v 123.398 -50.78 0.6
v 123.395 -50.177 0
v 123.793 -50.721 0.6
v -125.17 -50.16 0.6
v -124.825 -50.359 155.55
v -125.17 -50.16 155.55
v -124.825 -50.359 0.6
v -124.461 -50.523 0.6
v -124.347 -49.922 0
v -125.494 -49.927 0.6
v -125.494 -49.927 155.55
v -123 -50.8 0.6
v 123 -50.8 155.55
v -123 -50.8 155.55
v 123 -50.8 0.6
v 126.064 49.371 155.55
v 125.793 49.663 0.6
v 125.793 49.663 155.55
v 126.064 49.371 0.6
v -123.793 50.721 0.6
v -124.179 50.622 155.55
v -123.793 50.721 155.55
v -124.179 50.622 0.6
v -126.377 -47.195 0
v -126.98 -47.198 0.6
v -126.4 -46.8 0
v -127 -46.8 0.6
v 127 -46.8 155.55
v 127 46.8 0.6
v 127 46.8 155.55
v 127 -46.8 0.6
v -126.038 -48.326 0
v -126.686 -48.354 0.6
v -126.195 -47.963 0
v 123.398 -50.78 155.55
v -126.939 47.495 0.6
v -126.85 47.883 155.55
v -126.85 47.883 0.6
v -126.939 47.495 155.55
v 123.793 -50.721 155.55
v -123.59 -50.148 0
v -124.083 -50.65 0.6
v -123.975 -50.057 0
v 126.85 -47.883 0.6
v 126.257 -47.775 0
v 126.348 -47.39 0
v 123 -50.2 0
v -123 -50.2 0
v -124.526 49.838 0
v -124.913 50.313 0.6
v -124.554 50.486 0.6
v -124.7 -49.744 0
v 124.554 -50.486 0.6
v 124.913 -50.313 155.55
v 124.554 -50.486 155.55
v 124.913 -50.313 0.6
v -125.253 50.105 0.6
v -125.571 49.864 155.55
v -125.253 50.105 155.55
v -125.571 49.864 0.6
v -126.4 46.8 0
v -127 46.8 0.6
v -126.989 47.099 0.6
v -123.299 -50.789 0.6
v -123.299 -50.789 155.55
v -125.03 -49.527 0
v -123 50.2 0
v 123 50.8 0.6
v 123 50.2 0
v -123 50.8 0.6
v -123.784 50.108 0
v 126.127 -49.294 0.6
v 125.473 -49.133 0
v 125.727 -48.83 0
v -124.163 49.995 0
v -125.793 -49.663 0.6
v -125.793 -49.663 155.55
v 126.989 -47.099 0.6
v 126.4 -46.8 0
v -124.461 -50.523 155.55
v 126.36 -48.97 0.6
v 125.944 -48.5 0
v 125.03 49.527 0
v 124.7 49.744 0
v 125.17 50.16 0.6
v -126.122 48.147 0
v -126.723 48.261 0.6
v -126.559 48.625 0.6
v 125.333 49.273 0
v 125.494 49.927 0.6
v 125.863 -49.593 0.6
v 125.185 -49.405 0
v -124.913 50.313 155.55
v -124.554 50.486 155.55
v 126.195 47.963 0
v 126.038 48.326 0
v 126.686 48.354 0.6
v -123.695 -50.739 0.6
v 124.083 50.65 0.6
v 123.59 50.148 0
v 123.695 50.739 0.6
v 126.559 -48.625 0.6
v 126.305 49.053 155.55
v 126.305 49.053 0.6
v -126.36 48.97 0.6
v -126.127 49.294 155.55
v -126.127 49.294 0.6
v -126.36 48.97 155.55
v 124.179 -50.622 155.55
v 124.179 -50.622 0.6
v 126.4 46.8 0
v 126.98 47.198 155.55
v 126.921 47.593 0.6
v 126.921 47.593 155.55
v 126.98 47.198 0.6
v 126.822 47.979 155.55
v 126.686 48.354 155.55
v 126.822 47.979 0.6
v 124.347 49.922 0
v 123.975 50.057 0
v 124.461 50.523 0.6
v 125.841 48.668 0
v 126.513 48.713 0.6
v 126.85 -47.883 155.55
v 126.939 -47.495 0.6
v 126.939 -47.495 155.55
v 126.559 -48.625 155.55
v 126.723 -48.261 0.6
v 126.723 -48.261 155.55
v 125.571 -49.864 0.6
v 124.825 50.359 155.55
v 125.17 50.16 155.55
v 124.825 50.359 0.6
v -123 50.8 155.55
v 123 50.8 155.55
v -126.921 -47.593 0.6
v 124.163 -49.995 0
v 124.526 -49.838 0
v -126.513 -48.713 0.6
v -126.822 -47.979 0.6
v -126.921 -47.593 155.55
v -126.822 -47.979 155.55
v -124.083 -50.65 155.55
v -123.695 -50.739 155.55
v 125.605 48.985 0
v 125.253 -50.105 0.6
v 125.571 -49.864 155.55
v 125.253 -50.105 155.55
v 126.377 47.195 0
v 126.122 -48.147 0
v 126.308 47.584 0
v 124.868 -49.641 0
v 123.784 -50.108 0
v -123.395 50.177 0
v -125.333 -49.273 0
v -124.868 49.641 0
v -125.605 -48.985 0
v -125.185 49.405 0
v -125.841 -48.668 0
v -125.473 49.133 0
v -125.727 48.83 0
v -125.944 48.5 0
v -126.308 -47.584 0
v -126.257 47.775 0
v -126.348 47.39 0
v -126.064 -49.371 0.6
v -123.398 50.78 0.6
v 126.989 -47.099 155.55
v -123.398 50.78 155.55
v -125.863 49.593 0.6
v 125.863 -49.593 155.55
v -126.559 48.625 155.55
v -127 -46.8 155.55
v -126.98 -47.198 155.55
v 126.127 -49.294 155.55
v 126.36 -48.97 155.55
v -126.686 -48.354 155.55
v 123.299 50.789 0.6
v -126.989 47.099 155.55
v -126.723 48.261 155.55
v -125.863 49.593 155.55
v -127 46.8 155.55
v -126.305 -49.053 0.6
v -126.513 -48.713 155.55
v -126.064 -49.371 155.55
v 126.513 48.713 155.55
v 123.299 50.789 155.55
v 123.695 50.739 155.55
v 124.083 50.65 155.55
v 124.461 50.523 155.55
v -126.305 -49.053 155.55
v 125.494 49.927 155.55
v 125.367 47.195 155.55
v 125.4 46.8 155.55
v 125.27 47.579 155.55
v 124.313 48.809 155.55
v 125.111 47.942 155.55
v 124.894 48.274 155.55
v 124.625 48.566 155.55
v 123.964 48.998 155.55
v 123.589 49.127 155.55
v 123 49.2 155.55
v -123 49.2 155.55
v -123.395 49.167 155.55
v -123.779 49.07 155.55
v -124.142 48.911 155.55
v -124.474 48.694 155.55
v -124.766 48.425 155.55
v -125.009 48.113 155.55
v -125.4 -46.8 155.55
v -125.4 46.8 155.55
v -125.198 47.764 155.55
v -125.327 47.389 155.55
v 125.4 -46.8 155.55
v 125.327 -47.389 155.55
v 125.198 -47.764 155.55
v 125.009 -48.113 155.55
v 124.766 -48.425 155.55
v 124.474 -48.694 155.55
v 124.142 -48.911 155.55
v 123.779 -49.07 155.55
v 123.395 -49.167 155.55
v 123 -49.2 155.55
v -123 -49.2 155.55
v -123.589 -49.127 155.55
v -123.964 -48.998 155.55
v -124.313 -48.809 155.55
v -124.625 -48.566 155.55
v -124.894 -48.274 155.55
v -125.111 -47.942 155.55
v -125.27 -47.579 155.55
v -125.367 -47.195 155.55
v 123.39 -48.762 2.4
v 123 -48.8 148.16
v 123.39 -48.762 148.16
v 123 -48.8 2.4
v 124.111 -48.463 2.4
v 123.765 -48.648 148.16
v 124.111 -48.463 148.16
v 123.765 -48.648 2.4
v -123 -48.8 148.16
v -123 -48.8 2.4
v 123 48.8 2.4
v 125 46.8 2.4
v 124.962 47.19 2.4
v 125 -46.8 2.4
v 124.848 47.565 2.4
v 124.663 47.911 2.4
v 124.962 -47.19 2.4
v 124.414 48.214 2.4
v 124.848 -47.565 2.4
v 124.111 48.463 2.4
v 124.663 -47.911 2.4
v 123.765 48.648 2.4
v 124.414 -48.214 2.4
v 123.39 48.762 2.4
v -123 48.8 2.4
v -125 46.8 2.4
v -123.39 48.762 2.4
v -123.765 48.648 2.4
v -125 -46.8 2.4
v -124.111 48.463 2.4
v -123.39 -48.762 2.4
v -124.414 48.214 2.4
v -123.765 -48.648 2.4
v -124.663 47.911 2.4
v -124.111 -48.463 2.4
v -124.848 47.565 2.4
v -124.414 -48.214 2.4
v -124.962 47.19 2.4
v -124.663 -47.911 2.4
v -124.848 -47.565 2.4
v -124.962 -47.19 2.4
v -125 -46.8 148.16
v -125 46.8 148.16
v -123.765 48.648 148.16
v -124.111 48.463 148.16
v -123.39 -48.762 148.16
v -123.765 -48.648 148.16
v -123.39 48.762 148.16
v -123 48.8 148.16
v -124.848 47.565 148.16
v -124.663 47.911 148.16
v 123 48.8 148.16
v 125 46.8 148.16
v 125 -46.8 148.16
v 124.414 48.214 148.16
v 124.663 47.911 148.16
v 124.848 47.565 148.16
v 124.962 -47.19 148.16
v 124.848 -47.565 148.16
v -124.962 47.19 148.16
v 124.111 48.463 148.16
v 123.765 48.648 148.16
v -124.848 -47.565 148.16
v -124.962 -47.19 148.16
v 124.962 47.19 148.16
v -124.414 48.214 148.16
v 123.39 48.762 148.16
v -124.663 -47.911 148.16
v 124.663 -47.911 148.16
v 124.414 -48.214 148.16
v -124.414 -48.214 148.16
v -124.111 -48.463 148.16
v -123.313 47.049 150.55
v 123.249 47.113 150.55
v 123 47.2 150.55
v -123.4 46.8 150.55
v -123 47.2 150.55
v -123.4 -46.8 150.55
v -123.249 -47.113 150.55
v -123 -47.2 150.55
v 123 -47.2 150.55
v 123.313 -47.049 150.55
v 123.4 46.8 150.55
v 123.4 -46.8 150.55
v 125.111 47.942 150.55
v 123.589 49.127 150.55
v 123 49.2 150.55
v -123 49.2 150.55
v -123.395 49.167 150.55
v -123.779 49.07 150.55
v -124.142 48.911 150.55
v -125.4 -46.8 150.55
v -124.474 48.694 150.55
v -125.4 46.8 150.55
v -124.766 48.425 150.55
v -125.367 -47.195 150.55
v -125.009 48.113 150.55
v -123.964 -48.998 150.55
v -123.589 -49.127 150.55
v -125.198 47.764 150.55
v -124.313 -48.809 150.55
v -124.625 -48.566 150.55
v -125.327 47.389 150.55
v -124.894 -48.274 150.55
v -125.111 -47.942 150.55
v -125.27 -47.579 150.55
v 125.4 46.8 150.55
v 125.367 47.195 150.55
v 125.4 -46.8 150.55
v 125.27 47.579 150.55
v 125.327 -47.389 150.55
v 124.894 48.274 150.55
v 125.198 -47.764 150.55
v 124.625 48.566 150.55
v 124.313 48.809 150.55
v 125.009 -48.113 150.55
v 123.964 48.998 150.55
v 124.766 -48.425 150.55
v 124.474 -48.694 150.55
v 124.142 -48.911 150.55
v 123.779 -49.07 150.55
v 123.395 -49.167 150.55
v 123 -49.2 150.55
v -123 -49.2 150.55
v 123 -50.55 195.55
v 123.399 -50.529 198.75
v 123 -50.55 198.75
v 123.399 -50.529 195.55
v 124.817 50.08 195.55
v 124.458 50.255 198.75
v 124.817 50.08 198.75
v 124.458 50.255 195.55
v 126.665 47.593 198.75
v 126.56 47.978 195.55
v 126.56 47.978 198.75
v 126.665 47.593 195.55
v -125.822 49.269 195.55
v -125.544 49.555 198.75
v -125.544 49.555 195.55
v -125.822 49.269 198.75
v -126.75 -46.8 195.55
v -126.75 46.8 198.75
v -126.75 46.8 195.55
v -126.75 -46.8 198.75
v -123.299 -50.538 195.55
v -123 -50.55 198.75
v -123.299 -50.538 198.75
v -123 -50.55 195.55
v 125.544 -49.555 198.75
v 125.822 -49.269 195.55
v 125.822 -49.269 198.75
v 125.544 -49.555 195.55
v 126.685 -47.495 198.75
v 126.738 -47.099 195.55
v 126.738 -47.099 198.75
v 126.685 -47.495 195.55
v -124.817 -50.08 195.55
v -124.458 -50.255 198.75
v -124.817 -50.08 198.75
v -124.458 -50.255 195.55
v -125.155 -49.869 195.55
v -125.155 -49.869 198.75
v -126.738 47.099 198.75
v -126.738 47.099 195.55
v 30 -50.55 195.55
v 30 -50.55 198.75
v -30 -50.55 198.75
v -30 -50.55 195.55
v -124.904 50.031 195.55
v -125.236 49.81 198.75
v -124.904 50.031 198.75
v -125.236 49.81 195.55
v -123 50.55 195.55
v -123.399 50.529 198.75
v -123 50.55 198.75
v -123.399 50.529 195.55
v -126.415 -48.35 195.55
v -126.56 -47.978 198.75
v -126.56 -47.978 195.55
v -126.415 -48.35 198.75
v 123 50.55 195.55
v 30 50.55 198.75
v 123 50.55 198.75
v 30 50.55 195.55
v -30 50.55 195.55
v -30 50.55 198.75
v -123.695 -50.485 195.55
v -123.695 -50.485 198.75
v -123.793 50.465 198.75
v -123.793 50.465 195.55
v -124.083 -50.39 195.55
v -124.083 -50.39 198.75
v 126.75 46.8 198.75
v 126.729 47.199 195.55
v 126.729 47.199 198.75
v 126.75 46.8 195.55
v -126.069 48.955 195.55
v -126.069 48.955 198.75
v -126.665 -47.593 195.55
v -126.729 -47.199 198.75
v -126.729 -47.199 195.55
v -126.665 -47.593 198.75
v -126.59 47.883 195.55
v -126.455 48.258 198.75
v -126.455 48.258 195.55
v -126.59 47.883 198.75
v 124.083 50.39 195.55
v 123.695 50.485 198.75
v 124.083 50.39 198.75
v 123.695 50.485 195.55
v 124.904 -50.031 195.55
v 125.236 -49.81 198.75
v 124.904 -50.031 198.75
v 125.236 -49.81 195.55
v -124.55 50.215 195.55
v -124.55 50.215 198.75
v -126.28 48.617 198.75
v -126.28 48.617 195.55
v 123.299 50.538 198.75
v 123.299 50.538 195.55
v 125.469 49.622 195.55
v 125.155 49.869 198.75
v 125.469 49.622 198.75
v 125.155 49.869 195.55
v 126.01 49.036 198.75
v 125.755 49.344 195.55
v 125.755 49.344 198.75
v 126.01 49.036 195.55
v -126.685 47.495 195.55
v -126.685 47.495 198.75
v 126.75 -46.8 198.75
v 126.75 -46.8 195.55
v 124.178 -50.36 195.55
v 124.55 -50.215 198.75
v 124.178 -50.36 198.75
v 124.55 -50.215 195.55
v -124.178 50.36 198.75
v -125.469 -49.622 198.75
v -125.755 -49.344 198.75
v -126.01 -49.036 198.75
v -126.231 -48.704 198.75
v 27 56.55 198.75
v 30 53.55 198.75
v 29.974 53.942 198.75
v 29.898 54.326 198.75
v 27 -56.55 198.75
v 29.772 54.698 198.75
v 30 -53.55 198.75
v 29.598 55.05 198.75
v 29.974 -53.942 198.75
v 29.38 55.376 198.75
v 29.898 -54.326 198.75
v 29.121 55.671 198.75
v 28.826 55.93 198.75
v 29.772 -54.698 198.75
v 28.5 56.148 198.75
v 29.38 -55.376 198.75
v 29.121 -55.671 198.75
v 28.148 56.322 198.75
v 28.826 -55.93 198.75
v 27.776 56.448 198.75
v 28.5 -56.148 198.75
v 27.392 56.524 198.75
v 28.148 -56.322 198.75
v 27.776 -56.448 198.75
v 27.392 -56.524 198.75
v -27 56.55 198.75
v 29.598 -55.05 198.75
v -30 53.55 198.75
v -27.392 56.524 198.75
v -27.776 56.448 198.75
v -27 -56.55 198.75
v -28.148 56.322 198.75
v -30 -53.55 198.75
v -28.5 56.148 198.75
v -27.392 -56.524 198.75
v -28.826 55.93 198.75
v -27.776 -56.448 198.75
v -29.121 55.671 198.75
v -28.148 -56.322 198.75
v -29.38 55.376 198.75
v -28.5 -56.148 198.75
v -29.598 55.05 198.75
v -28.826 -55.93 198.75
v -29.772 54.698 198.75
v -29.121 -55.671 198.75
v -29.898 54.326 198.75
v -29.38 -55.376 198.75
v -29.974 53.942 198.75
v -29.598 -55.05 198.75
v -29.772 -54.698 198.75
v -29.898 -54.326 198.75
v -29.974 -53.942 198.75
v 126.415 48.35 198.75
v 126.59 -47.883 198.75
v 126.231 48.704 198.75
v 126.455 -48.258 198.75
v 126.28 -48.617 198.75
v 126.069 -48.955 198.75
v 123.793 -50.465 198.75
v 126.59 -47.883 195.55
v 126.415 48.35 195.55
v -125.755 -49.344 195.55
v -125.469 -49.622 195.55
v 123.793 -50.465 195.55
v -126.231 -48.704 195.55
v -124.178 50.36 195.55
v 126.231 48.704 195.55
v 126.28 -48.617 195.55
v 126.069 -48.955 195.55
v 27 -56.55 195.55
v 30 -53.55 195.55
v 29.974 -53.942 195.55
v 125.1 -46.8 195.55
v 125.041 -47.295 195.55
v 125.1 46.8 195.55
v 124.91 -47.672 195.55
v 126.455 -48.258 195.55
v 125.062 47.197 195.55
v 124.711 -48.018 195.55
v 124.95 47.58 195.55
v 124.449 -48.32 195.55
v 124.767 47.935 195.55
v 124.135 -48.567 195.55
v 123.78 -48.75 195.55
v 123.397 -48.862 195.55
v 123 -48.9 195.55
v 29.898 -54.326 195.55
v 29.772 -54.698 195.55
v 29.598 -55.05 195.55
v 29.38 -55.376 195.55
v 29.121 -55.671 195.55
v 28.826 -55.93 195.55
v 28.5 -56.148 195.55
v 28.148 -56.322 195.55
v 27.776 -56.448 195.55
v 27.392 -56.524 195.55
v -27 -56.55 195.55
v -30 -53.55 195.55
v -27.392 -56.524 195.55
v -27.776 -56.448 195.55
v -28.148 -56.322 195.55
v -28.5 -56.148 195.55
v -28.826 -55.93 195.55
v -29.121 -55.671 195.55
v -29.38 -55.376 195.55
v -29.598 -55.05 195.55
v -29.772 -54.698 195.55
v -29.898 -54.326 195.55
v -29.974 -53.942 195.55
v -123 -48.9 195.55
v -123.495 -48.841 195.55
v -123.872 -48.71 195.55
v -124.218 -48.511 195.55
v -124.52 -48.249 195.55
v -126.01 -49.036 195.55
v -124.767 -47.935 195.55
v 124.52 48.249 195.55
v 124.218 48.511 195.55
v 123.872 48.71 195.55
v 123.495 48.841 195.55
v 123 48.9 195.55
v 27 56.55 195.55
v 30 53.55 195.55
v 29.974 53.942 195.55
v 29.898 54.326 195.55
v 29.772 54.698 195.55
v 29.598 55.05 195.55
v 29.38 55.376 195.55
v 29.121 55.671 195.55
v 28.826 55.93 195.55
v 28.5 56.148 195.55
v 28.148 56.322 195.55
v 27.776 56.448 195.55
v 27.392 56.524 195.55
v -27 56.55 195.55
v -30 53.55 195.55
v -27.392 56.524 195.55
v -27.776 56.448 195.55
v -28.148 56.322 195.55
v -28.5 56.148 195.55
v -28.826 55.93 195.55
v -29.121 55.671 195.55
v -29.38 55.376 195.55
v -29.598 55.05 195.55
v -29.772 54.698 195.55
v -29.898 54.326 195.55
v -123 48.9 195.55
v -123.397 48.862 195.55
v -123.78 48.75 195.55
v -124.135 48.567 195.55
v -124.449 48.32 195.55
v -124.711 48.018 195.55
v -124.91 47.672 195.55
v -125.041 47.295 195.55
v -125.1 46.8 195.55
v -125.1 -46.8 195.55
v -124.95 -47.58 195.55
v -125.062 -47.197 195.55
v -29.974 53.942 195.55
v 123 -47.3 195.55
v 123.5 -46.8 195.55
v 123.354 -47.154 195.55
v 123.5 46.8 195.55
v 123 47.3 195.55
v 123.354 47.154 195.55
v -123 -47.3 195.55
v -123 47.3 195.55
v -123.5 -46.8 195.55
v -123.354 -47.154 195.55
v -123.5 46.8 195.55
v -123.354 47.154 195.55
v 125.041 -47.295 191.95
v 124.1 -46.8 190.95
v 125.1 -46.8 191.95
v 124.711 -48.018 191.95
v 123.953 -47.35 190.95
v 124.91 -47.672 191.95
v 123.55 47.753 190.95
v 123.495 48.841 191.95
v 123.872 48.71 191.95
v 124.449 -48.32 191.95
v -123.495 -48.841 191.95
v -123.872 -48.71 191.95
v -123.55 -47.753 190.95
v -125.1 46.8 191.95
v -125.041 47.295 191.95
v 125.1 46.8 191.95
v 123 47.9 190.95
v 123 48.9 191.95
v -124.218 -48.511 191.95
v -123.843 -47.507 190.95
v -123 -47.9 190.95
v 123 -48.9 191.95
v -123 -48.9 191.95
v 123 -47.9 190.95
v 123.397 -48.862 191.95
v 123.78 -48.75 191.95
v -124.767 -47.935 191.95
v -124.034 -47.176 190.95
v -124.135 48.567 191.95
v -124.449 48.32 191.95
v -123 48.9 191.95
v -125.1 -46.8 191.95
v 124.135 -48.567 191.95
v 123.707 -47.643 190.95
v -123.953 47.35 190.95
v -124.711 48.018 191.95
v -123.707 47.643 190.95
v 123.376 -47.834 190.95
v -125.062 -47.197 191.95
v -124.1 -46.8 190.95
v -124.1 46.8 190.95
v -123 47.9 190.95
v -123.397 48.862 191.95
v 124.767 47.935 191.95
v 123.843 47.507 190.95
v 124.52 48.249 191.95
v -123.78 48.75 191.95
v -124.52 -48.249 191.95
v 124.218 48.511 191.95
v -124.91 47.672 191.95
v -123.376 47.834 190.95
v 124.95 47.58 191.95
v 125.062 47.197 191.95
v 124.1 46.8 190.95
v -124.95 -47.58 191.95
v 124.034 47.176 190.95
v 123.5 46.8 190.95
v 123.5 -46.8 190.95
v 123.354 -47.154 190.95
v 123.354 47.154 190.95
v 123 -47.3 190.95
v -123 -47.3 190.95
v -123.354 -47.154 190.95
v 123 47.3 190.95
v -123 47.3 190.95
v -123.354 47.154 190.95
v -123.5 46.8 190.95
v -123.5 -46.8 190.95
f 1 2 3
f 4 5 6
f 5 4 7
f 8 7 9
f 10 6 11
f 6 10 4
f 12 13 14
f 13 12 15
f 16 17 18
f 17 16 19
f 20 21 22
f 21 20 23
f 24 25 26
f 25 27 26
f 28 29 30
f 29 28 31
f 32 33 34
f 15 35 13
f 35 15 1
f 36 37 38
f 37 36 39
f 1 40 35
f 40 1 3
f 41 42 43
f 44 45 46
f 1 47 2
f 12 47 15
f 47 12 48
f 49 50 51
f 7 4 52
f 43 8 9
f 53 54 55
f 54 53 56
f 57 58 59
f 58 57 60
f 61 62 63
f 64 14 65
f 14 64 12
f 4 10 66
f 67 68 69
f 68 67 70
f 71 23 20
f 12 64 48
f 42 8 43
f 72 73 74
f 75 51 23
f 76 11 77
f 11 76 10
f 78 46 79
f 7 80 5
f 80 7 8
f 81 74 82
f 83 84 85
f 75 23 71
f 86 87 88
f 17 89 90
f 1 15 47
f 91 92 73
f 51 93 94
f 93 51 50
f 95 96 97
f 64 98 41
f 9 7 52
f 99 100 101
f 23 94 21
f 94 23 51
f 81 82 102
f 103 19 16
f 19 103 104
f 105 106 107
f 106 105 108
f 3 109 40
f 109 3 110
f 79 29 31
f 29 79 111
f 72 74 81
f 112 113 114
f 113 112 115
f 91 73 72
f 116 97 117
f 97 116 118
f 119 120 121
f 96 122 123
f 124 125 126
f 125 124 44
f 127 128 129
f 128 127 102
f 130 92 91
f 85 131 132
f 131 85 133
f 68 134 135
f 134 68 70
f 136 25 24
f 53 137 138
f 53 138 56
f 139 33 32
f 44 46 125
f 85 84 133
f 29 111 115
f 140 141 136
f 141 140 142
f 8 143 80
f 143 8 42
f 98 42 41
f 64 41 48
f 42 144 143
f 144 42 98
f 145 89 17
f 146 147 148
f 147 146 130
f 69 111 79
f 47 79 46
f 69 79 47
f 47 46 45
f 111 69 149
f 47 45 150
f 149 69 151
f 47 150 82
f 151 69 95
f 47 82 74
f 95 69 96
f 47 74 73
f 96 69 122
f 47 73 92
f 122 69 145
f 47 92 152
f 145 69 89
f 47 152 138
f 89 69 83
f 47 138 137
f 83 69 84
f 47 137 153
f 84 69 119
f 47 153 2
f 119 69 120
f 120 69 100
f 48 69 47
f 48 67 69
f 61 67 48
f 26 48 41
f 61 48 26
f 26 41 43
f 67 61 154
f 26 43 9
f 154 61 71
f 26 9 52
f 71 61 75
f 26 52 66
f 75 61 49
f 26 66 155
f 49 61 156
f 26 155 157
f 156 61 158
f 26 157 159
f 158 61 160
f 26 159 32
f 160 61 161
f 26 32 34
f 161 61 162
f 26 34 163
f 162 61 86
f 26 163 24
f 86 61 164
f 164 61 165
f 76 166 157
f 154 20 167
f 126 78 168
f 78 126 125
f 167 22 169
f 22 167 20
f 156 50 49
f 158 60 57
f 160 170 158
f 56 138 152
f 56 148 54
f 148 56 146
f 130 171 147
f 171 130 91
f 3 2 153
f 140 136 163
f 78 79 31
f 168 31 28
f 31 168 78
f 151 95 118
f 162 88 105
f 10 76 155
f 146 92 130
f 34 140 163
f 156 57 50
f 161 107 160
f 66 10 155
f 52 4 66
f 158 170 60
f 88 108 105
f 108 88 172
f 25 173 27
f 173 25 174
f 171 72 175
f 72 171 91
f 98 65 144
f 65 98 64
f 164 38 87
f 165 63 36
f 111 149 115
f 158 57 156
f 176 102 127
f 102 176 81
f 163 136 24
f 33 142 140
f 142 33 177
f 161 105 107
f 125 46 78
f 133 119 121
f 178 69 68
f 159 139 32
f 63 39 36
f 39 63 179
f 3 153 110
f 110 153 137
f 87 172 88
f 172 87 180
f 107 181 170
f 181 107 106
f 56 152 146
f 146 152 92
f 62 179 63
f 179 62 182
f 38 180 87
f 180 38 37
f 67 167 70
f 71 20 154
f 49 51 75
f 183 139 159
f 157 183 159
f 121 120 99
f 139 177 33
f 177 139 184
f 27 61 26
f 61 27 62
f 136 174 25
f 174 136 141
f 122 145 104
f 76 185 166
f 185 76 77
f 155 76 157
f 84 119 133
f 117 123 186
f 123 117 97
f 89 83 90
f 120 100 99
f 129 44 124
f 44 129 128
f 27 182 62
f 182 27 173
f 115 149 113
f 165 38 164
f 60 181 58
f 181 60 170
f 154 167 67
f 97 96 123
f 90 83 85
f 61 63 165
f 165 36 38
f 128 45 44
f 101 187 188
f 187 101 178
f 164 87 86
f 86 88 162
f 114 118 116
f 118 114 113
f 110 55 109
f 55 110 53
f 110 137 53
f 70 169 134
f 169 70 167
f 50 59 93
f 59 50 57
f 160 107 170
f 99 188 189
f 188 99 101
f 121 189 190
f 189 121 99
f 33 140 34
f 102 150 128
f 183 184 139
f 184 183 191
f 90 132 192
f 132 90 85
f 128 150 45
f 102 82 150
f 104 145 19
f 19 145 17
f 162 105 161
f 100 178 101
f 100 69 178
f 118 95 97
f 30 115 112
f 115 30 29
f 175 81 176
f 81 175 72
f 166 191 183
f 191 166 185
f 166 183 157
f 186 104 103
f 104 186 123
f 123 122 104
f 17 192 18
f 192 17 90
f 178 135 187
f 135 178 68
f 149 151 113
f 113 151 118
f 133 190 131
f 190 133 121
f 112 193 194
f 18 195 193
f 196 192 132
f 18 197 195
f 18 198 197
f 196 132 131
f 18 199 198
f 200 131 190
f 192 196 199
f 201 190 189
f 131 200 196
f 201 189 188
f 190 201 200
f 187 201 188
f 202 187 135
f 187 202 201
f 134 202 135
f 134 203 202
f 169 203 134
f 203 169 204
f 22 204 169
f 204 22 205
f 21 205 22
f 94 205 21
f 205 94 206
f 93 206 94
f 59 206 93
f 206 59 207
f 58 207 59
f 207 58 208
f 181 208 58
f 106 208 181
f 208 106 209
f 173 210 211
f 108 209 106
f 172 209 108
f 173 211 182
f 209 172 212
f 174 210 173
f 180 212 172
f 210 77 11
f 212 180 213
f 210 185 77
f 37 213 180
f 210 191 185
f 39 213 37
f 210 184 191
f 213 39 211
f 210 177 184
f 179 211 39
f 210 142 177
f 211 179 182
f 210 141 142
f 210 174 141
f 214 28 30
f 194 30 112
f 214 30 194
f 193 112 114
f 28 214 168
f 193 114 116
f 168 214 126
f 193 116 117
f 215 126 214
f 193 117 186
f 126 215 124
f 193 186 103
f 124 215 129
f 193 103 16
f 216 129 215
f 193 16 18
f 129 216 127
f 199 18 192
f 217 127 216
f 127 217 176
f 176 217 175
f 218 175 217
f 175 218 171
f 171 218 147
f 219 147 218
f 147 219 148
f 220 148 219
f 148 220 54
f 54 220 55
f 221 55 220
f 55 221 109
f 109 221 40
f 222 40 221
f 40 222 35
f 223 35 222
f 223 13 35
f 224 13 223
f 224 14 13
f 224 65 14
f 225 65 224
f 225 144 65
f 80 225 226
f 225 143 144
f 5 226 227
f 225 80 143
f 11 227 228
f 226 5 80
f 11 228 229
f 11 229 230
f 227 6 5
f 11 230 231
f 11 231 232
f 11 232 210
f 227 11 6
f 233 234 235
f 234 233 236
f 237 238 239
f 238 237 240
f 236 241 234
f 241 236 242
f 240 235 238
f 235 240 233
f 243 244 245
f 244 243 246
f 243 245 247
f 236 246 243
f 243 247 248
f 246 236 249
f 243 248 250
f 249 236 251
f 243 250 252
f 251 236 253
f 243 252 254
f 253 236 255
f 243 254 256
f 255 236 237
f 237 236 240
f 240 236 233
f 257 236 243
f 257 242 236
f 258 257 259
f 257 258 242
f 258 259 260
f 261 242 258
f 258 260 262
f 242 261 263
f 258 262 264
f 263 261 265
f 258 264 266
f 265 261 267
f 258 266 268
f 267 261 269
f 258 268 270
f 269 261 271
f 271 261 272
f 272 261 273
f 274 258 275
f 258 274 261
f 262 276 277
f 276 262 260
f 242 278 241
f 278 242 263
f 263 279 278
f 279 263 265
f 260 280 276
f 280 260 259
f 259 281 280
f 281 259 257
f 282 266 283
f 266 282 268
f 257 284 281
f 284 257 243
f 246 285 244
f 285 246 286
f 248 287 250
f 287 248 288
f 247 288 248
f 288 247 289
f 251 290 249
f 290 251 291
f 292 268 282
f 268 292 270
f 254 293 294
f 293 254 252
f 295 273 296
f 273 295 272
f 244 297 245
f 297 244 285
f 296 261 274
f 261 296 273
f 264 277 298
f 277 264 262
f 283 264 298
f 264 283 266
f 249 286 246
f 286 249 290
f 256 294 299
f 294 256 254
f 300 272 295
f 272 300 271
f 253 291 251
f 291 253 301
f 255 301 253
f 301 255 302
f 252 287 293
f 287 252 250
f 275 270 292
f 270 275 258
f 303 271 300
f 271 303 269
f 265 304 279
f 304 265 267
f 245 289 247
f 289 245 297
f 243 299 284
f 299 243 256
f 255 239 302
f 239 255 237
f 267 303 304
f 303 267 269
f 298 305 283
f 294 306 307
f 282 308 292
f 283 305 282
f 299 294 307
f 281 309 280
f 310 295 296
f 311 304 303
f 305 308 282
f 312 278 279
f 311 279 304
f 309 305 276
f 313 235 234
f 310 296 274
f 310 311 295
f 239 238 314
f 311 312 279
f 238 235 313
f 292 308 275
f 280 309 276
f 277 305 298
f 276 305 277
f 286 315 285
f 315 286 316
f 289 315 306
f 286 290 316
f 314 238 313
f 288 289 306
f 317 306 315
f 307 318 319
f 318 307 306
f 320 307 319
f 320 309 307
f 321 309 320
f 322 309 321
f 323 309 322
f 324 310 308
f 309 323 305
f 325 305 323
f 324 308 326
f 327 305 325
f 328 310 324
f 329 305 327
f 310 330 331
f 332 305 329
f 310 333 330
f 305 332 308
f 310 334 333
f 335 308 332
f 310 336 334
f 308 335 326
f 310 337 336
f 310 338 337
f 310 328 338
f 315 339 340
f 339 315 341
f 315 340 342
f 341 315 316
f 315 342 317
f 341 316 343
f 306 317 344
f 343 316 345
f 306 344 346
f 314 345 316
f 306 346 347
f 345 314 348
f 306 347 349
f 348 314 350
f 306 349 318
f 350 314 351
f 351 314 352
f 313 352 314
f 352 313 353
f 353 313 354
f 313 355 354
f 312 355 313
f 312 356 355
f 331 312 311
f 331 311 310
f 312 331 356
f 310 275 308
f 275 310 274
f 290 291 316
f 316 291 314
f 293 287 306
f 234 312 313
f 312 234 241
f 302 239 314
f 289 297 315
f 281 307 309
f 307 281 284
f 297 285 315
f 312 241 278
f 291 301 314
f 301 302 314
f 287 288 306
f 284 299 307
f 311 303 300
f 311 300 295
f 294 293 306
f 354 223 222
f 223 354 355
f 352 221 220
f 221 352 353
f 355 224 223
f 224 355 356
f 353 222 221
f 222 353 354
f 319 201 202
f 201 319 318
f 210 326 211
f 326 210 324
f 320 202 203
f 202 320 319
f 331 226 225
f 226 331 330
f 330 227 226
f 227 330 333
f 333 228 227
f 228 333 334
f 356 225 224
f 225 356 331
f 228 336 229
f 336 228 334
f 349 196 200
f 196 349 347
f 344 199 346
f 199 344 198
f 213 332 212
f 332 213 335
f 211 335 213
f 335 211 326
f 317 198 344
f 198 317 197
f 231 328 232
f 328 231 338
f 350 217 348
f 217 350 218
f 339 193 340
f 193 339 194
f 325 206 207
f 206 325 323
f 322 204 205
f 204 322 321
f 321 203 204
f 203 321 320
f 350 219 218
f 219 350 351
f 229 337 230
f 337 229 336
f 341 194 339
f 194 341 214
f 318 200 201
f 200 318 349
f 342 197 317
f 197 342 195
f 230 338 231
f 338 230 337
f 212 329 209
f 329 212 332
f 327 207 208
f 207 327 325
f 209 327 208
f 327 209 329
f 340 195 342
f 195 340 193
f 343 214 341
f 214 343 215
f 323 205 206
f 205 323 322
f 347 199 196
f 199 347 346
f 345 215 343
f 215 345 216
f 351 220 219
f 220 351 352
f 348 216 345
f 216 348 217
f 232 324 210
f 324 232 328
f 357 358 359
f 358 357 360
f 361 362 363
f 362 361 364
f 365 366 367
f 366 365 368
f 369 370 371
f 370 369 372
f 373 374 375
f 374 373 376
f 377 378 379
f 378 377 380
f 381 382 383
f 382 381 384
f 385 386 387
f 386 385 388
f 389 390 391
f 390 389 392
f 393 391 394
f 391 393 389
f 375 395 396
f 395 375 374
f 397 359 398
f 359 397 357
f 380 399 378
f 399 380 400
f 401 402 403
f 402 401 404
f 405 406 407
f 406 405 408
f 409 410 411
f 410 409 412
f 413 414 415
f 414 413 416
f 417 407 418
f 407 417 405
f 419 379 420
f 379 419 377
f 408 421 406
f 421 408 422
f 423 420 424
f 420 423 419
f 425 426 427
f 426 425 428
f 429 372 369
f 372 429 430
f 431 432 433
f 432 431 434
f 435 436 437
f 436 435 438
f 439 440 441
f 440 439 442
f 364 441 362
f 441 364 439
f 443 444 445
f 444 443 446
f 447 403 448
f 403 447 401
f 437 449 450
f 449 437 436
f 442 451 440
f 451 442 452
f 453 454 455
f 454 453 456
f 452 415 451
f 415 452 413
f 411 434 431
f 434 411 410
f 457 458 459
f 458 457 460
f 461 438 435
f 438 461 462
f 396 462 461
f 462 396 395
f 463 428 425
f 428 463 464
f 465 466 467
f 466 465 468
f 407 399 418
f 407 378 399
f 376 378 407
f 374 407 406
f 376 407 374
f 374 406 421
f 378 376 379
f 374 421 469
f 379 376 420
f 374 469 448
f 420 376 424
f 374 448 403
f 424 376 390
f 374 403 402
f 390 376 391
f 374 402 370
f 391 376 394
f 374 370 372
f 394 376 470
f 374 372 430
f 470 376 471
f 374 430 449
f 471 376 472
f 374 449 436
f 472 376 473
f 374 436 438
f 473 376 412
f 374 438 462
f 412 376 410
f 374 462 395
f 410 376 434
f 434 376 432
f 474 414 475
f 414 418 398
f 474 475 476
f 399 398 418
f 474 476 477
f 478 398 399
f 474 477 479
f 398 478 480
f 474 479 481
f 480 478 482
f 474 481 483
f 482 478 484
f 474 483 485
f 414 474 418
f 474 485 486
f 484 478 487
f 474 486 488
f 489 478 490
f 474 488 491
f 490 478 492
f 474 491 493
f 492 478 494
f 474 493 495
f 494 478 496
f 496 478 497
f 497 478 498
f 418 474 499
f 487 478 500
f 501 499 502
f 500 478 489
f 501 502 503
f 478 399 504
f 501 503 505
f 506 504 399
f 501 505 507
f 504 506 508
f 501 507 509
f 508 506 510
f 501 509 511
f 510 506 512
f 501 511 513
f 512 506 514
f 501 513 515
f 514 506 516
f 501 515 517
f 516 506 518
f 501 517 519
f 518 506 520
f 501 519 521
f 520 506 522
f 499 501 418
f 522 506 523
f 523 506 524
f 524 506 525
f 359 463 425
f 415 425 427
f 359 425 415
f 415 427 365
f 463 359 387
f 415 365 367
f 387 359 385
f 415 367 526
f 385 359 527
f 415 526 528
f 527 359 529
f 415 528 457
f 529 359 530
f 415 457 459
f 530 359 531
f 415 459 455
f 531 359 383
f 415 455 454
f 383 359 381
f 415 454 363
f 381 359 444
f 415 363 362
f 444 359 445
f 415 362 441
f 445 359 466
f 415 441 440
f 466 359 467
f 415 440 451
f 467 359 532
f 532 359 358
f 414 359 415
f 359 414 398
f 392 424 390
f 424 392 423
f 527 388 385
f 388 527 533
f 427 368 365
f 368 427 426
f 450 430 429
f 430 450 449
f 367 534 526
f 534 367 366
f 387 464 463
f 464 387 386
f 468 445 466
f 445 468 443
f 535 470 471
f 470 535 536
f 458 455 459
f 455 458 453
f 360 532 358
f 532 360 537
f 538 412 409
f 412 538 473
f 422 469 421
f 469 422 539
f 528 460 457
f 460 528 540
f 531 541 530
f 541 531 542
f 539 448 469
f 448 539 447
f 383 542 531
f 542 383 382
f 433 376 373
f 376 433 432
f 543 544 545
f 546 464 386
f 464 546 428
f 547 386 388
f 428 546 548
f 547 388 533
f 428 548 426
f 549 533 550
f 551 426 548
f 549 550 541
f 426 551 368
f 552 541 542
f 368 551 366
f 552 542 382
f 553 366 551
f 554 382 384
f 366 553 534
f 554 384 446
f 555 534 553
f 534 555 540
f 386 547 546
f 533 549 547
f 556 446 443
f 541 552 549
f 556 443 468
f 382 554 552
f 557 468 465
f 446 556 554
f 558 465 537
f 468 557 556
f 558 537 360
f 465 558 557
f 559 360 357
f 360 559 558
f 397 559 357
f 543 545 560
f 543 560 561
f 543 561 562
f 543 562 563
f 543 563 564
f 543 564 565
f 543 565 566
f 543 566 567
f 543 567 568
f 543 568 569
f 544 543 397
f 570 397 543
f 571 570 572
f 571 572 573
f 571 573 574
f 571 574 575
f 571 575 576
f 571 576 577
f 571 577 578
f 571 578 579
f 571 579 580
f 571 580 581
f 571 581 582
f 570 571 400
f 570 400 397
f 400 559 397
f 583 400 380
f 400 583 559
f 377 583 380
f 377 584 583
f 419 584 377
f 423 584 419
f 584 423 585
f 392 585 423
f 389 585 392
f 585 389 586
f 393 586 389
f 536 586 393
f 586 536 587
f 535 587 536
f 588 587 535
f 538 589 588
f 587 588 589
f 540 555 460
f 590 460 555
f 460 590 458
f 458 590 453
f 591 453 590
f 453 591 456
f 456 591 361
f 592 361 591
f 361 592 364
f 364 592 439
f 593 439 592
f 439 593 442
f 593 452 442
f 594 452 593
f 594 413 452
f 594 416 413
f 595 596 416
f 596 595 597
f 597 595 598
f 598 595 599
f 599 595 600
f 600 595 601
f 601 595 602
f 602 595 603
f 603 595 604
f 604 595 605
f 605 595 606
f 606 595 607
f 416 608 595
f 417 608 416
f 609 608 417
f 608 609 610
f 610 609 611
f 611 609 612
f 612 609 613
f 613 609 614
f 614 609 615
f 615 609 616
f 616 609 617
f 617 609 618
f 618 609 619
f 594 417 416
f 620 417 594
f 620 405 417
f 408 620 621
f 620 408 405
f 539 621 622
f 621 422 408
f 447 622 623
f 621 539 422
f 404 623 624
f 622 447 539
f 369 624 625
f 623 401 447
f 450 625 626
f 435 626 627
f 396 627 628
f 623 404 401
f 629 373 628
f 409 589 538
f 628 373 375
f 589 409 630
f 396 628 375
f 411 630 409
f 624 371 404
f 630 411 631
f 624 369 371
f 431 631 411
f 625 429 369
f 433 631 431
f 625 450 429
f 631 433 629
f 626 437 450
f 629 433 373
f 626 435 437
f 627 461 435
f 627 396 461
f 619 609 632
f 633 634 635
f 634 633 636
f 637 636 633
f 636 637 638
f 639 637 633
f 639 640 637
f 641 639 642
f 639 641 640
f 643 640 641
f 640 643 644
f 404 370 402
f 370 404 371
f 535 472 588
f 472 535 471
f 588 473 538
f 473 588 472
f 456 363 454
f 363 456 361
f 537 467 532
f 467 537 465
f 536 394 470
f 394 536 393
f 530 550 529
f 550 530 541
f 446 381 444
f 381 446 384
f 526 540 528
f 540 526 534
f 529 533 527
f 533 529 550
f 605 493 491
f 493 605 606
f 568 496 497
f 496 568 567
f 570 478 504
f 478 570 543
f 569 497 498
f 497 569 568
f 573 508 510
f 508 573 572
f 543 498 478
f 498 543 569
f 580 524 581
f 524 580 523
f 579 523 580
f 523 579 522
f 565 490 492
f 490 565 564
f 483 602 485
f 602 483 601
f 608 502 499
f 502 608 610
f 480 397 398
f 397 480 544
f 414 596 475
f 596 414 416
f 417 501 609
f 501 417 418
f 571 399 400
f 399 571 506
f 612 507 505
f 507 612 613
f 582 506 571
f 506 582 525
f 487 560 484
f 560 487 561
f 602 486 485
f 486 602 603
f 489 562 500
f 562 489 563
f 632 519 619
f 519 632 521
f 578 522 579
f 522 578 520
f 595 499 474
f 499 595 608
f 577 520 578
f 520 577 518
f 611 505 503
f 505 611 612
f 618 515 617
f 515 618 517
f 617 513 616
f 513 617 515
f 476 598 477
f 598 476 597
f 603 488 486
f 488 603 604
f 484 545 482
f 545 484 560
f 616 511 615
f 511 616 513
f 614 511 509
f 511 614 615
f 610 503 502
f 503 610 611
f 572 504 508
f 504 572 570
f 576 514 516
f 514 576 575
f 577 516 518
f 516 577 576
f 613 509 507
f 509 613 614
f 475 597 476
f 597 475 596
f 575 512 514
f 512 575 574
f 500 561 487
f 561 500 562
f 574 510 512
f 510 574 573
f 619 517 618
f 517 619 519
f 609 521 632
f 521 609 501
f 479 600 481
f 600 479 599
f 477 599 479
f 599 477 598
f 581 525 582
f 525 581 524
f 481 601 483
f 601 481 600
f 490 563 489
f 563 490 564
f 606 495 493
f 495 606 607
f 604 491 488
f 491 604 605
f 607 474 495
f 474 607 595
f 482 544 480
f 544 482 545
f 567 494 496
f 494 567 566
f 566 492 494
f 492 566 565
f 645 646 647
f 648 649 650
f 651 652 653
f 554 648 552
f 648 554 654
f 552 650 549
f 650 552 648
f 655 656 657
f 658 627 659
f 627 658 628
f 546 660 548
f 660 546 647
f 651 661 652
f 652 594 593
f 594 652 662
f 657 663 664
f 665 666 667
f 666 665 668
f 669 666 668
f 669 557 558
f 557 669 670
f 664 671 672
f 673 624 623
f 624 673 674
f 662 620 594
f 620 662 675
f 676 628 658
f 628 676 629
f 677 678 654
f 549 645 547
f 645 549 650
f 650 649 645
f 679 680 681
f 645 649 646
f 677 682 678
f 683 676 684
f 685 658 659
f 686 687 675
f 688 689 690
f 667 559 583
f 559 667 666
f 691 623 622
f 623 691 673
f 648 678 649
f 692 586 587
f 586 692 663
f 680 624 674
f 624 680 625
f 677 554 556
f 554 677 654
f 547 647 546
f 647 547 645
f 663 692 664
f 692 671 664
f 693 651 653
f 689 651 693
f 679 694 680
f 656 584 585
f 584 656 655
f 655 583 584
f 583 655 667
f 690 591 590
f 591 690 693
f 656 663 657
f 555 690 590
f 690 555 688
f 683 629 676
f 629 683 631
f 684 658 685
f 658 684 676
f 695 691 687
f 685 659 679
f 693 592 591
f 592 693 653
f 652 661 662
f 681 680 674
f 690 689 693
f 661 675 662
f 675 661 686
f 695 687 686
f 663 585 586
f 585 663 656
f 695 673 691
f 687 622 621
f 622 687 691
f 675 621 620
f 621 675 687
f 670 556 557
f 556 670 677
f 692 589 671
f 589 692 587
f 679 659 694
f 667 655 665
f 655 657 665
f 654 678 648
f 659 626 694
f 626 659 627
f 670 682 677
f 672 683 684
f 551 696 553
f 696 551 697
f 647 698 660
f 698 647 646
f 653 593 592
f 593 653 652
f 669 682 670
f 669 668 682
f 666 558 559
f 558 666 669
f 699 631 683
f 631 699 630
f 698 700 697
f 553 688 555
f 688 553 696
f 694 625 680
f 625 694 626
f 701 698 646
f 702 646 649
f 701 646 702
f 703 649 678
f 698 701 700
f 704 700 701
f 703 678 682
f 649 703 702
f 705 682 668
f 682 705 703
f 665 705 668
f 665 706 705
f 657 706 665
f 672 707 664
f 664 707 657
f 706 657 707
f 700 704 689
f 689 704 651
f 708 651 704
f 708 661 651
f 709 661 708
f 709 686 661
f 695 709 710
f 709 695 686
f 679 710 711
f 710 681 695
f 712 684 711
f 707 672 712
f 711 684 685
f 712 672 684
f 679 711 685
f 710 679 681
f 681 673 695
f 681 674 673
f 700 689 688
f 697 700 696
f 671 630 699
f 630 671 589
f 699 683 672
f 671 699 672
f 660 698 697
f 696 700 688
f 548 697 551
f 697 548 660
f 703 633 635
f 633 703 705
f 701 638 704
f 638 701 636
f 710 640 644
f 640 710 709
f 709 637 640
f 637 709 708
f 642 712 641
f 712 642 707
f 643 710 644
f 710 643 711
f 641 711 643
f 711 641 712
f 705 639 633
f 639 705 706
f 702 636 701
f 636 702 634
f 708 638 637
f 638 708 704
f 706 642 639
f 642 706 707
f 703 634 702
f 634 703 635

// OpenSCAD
// photo_box — shipping box for photos, with a proud inset lid
//
// Two parts, single-colour PLA, both print without supports.
//   box  prints open-face-up, floor on the bed
//   lid  prints top-face-down, skirt pointing up
//
// The four numbers below are the ones to change. Everything else is
// derived, so the model stays coherent at any size.

// ---- outside envelope (lid on) ----------------------------------------
box_w = 254;      // 10"    width
box_d = 101.6;    // 4"     depth
box_h = 158.75;   // 6.25"  height, lid seated

// ---- thicknesses ------------------------------------------------------
wall_t  = 2.0;    // side walls        (5 perimeters @ 0.4)
floor_t = 2.4;    // box floor         (6 perimeters)
lid_t   = 3.2;    // lid plate         (8 perimeters)

// ---- lid interface ----------------------------------------------------
rabbet_h = 5.0;   // how far the ledge sits below the rim
ledge_w  = 2.0;   // horizontal width of the ledge
rim_t    = 1.6;   // standing rim above the ledge (4 perimeters)
ramp_h   = 2.4;   // ramp thickening the wall into the rabbet zone. Rises 2.4
                  // while growing 1.6 inward — 34 deg off vertical, so it sits
                  // clear of the 45 deg self-support limit rather than on it.
skirt_w  = 1.6;   // lid skirt thickness (4 perimeters)
clr      = 0.3;   // lateral clearance, skirt to rim (PLA)
seat_gap = 0.4;   // skirt clears the ledge — the rim is the seat, not the ledge

// ---- cosmetic / ergonomic --------------------------------------------
corner_r   = 4.0;  // outside corner radius
lid_relief = 0.25; // lid plate inset from the outer face, per side
skirt_cham = 1.0;  // 45 deg lead-in so the lid self-centres on the way in
foot_cham  = 0.6;  // bottom outer edge — chamfer, not a round (elephant's foot)
grip_tab   = 6.0;  // lid grab tabs on front/back; set 0 for a plain rectangle
grip_tab_w = 60.0;

// ---- output -----------------------------------------------------------
part = "both";     // "box" | "lid" | "both"

$fa = 2;
$fs = 0.4;

// ---- derived ----------------------------------------------------------
body_h   = box_h - lid_t;        // rim top: the lid plate sits on this
ledge_z  = body_h - rabbet_h;    // up-facing ledge surface
ramp_z   = ledge_z - ramp_h;     // where the wall starts thickening
top_wall = rim_t + ledge_w;      // wall thickness through the rabbet zone
skirt_h  = rabbet_h - seat_gap;  // skirt stops short of the ledge

// Rounded-rectangle prism, centred in x/y, rising from z = 0.
module rrect_prism(w, d, r, h) {
    rr = max(min(r, w / 2 - 0.01, d / 2 - 0.01), 0.01);
    linear_extrude(height = h)
        offset(r = rr)
            square([w - 2 * rr, d - 2 * rr], center = true);
}

// ---- box --------------------------------------------------------------

module box_outer() {
    // Chamfered foot, then a straight prism the rest of the way up.
    hull() {
        rrect_prism(box_w - 2 * foot_cham, box_d - 2 * foot_cham,
                    corner_r - foot_cham, 0.01);
        translate([0, 0, foot_cham]) rrect_prism(box_w, box_d, corner_r, 0.01);
    }
    translate([0, 0, foot_cham])
        rrect_prism(box_w, box_d, corner_r, body_h - foot_cham);
}

// The cavity is cut in three stacked pieces. Each one is *wider* than the
// piece below it or tapers into it, so every newly exposed surface faces up
// or sits at 45 deg — nothing to support.
module box_cavity() {
    // Main volume, floor up to the ramp.
    translate([0, 0, floor_t])
        rrect_prism(box_w - 2 * wall_t, box_d - 2 * wall_t,
                    corner_r - wall_t, ramp_z - floor_t + 0.01);

    // 45 deg ramp: the wall thickens inward from wall_t to top_wall, giving
    // the rabbet something solid to be cut out of and hooping the top of a
    // large thin-walled box.
    hull() {
        translate([0, 0, ramp_z])
            rrect_prism(box_w - 2 * wall_t, box_d - 2 * wall_t,
                        corner_r - wall_t, 0.01);
        translate([0, 0, ledge_z - 0.01])
            rrect_prism(box_w - 2 * top_wall, box_d - 2 * top_wall,
                        corner_r - top_wall, 0.01);
    }

    // Rabbet: a wider cut above the ledge leaves the ledge as an up-facing
    // shelf and the rim as a standing fin.
    translate([0, 0, ledge_z])
        rrect_prism(box_w - 2 * rim_t, box_d - 2 * rim_t,
                    corner_r - rim_t, rabbet_h + 1);
}

module box() {
    difference() {
        box_outer();
        box_cavity();
    }
}

// ---- lid --------------------------------------------------------------
// Modelled in the assembled orientation: plate on top, skirt hanging down
// into the rabbet. Flipped for printing at the bottom of the file.

skirt_ow = box_w - 2 * rim_t - 2 * clr;
skirt_od = box_d - 2 * rim_t - 2 * clr;
skirt_or = corner_r - rim_t - clr;
skirt_z0 = body_h - skirt_h;

module lid() {
    // Plate, plus grab tabs overhanging the front and back walls.
    translate([0, 0, body_h]) {
        rrect_prism(box_w - 2 * lid_relief, box_d - 2 * lid_relief,
                    corner_r - lid_relief, lid_t);
        if (grip_tab > 0)
            rrect_prism(grip_tab_w,
                        box_d - 2 * lid_relief + 2 * grip_tab, 3, lid_t);
    }

    // Skirt: lateral register only. Its outer face runs against the rim's
    // inner face; a 45 deg lead-in lets it find the opening on the way down.
    difference() {
        union() {
            hull() {
                translate([0, 0, skirt_z0])
                    rrect_prism(skirt_ow - 2 * skirt_cham,
                                skirt_od - 2 * skirt_cham,
                                skirt_or - skirt_cham, 0.01);
                translate([0, 0, skirt_z0 + skirt_cham])
                    rrect_prism(skirt_ow, skirt_od, skirt_or, 0.01);
            }
            translate([0, 0, skirt_z0 + skirt_cham])
                rrect_prism(skirt_ow, skirt_od, skirt_or,
                            skirt_h - skirt_cham + 0.01);
        }
        translate([0, 0, skirt_z0 - 1])
            rrect_prism(skirt_ow - 2 * skirt_w, skirt_od - 2 * skirt_w,
                        skirt_or - skirt_w, skirt_h + 2);
    }
}

// Lid rotated onto its print orientation: visible face down on the bed.
module lid_printed() {
    translate([0, 0, box_h]) rotate([180, 0, 0]) lid();
}

// ---- output -----------------------------------------------------------

if (part == "box") {
    box();
} else if (part == "lid") {
    lid_printed();
} else if (part == "both") {
    // Exploded preview — lid lifted clear so the rabbet is visible.
    box();
    translate([0, 0, 40]) lid();
}
// Any other value emits nothing, so this file can be included and
// section-cut for debugging without drawing the whole model.
